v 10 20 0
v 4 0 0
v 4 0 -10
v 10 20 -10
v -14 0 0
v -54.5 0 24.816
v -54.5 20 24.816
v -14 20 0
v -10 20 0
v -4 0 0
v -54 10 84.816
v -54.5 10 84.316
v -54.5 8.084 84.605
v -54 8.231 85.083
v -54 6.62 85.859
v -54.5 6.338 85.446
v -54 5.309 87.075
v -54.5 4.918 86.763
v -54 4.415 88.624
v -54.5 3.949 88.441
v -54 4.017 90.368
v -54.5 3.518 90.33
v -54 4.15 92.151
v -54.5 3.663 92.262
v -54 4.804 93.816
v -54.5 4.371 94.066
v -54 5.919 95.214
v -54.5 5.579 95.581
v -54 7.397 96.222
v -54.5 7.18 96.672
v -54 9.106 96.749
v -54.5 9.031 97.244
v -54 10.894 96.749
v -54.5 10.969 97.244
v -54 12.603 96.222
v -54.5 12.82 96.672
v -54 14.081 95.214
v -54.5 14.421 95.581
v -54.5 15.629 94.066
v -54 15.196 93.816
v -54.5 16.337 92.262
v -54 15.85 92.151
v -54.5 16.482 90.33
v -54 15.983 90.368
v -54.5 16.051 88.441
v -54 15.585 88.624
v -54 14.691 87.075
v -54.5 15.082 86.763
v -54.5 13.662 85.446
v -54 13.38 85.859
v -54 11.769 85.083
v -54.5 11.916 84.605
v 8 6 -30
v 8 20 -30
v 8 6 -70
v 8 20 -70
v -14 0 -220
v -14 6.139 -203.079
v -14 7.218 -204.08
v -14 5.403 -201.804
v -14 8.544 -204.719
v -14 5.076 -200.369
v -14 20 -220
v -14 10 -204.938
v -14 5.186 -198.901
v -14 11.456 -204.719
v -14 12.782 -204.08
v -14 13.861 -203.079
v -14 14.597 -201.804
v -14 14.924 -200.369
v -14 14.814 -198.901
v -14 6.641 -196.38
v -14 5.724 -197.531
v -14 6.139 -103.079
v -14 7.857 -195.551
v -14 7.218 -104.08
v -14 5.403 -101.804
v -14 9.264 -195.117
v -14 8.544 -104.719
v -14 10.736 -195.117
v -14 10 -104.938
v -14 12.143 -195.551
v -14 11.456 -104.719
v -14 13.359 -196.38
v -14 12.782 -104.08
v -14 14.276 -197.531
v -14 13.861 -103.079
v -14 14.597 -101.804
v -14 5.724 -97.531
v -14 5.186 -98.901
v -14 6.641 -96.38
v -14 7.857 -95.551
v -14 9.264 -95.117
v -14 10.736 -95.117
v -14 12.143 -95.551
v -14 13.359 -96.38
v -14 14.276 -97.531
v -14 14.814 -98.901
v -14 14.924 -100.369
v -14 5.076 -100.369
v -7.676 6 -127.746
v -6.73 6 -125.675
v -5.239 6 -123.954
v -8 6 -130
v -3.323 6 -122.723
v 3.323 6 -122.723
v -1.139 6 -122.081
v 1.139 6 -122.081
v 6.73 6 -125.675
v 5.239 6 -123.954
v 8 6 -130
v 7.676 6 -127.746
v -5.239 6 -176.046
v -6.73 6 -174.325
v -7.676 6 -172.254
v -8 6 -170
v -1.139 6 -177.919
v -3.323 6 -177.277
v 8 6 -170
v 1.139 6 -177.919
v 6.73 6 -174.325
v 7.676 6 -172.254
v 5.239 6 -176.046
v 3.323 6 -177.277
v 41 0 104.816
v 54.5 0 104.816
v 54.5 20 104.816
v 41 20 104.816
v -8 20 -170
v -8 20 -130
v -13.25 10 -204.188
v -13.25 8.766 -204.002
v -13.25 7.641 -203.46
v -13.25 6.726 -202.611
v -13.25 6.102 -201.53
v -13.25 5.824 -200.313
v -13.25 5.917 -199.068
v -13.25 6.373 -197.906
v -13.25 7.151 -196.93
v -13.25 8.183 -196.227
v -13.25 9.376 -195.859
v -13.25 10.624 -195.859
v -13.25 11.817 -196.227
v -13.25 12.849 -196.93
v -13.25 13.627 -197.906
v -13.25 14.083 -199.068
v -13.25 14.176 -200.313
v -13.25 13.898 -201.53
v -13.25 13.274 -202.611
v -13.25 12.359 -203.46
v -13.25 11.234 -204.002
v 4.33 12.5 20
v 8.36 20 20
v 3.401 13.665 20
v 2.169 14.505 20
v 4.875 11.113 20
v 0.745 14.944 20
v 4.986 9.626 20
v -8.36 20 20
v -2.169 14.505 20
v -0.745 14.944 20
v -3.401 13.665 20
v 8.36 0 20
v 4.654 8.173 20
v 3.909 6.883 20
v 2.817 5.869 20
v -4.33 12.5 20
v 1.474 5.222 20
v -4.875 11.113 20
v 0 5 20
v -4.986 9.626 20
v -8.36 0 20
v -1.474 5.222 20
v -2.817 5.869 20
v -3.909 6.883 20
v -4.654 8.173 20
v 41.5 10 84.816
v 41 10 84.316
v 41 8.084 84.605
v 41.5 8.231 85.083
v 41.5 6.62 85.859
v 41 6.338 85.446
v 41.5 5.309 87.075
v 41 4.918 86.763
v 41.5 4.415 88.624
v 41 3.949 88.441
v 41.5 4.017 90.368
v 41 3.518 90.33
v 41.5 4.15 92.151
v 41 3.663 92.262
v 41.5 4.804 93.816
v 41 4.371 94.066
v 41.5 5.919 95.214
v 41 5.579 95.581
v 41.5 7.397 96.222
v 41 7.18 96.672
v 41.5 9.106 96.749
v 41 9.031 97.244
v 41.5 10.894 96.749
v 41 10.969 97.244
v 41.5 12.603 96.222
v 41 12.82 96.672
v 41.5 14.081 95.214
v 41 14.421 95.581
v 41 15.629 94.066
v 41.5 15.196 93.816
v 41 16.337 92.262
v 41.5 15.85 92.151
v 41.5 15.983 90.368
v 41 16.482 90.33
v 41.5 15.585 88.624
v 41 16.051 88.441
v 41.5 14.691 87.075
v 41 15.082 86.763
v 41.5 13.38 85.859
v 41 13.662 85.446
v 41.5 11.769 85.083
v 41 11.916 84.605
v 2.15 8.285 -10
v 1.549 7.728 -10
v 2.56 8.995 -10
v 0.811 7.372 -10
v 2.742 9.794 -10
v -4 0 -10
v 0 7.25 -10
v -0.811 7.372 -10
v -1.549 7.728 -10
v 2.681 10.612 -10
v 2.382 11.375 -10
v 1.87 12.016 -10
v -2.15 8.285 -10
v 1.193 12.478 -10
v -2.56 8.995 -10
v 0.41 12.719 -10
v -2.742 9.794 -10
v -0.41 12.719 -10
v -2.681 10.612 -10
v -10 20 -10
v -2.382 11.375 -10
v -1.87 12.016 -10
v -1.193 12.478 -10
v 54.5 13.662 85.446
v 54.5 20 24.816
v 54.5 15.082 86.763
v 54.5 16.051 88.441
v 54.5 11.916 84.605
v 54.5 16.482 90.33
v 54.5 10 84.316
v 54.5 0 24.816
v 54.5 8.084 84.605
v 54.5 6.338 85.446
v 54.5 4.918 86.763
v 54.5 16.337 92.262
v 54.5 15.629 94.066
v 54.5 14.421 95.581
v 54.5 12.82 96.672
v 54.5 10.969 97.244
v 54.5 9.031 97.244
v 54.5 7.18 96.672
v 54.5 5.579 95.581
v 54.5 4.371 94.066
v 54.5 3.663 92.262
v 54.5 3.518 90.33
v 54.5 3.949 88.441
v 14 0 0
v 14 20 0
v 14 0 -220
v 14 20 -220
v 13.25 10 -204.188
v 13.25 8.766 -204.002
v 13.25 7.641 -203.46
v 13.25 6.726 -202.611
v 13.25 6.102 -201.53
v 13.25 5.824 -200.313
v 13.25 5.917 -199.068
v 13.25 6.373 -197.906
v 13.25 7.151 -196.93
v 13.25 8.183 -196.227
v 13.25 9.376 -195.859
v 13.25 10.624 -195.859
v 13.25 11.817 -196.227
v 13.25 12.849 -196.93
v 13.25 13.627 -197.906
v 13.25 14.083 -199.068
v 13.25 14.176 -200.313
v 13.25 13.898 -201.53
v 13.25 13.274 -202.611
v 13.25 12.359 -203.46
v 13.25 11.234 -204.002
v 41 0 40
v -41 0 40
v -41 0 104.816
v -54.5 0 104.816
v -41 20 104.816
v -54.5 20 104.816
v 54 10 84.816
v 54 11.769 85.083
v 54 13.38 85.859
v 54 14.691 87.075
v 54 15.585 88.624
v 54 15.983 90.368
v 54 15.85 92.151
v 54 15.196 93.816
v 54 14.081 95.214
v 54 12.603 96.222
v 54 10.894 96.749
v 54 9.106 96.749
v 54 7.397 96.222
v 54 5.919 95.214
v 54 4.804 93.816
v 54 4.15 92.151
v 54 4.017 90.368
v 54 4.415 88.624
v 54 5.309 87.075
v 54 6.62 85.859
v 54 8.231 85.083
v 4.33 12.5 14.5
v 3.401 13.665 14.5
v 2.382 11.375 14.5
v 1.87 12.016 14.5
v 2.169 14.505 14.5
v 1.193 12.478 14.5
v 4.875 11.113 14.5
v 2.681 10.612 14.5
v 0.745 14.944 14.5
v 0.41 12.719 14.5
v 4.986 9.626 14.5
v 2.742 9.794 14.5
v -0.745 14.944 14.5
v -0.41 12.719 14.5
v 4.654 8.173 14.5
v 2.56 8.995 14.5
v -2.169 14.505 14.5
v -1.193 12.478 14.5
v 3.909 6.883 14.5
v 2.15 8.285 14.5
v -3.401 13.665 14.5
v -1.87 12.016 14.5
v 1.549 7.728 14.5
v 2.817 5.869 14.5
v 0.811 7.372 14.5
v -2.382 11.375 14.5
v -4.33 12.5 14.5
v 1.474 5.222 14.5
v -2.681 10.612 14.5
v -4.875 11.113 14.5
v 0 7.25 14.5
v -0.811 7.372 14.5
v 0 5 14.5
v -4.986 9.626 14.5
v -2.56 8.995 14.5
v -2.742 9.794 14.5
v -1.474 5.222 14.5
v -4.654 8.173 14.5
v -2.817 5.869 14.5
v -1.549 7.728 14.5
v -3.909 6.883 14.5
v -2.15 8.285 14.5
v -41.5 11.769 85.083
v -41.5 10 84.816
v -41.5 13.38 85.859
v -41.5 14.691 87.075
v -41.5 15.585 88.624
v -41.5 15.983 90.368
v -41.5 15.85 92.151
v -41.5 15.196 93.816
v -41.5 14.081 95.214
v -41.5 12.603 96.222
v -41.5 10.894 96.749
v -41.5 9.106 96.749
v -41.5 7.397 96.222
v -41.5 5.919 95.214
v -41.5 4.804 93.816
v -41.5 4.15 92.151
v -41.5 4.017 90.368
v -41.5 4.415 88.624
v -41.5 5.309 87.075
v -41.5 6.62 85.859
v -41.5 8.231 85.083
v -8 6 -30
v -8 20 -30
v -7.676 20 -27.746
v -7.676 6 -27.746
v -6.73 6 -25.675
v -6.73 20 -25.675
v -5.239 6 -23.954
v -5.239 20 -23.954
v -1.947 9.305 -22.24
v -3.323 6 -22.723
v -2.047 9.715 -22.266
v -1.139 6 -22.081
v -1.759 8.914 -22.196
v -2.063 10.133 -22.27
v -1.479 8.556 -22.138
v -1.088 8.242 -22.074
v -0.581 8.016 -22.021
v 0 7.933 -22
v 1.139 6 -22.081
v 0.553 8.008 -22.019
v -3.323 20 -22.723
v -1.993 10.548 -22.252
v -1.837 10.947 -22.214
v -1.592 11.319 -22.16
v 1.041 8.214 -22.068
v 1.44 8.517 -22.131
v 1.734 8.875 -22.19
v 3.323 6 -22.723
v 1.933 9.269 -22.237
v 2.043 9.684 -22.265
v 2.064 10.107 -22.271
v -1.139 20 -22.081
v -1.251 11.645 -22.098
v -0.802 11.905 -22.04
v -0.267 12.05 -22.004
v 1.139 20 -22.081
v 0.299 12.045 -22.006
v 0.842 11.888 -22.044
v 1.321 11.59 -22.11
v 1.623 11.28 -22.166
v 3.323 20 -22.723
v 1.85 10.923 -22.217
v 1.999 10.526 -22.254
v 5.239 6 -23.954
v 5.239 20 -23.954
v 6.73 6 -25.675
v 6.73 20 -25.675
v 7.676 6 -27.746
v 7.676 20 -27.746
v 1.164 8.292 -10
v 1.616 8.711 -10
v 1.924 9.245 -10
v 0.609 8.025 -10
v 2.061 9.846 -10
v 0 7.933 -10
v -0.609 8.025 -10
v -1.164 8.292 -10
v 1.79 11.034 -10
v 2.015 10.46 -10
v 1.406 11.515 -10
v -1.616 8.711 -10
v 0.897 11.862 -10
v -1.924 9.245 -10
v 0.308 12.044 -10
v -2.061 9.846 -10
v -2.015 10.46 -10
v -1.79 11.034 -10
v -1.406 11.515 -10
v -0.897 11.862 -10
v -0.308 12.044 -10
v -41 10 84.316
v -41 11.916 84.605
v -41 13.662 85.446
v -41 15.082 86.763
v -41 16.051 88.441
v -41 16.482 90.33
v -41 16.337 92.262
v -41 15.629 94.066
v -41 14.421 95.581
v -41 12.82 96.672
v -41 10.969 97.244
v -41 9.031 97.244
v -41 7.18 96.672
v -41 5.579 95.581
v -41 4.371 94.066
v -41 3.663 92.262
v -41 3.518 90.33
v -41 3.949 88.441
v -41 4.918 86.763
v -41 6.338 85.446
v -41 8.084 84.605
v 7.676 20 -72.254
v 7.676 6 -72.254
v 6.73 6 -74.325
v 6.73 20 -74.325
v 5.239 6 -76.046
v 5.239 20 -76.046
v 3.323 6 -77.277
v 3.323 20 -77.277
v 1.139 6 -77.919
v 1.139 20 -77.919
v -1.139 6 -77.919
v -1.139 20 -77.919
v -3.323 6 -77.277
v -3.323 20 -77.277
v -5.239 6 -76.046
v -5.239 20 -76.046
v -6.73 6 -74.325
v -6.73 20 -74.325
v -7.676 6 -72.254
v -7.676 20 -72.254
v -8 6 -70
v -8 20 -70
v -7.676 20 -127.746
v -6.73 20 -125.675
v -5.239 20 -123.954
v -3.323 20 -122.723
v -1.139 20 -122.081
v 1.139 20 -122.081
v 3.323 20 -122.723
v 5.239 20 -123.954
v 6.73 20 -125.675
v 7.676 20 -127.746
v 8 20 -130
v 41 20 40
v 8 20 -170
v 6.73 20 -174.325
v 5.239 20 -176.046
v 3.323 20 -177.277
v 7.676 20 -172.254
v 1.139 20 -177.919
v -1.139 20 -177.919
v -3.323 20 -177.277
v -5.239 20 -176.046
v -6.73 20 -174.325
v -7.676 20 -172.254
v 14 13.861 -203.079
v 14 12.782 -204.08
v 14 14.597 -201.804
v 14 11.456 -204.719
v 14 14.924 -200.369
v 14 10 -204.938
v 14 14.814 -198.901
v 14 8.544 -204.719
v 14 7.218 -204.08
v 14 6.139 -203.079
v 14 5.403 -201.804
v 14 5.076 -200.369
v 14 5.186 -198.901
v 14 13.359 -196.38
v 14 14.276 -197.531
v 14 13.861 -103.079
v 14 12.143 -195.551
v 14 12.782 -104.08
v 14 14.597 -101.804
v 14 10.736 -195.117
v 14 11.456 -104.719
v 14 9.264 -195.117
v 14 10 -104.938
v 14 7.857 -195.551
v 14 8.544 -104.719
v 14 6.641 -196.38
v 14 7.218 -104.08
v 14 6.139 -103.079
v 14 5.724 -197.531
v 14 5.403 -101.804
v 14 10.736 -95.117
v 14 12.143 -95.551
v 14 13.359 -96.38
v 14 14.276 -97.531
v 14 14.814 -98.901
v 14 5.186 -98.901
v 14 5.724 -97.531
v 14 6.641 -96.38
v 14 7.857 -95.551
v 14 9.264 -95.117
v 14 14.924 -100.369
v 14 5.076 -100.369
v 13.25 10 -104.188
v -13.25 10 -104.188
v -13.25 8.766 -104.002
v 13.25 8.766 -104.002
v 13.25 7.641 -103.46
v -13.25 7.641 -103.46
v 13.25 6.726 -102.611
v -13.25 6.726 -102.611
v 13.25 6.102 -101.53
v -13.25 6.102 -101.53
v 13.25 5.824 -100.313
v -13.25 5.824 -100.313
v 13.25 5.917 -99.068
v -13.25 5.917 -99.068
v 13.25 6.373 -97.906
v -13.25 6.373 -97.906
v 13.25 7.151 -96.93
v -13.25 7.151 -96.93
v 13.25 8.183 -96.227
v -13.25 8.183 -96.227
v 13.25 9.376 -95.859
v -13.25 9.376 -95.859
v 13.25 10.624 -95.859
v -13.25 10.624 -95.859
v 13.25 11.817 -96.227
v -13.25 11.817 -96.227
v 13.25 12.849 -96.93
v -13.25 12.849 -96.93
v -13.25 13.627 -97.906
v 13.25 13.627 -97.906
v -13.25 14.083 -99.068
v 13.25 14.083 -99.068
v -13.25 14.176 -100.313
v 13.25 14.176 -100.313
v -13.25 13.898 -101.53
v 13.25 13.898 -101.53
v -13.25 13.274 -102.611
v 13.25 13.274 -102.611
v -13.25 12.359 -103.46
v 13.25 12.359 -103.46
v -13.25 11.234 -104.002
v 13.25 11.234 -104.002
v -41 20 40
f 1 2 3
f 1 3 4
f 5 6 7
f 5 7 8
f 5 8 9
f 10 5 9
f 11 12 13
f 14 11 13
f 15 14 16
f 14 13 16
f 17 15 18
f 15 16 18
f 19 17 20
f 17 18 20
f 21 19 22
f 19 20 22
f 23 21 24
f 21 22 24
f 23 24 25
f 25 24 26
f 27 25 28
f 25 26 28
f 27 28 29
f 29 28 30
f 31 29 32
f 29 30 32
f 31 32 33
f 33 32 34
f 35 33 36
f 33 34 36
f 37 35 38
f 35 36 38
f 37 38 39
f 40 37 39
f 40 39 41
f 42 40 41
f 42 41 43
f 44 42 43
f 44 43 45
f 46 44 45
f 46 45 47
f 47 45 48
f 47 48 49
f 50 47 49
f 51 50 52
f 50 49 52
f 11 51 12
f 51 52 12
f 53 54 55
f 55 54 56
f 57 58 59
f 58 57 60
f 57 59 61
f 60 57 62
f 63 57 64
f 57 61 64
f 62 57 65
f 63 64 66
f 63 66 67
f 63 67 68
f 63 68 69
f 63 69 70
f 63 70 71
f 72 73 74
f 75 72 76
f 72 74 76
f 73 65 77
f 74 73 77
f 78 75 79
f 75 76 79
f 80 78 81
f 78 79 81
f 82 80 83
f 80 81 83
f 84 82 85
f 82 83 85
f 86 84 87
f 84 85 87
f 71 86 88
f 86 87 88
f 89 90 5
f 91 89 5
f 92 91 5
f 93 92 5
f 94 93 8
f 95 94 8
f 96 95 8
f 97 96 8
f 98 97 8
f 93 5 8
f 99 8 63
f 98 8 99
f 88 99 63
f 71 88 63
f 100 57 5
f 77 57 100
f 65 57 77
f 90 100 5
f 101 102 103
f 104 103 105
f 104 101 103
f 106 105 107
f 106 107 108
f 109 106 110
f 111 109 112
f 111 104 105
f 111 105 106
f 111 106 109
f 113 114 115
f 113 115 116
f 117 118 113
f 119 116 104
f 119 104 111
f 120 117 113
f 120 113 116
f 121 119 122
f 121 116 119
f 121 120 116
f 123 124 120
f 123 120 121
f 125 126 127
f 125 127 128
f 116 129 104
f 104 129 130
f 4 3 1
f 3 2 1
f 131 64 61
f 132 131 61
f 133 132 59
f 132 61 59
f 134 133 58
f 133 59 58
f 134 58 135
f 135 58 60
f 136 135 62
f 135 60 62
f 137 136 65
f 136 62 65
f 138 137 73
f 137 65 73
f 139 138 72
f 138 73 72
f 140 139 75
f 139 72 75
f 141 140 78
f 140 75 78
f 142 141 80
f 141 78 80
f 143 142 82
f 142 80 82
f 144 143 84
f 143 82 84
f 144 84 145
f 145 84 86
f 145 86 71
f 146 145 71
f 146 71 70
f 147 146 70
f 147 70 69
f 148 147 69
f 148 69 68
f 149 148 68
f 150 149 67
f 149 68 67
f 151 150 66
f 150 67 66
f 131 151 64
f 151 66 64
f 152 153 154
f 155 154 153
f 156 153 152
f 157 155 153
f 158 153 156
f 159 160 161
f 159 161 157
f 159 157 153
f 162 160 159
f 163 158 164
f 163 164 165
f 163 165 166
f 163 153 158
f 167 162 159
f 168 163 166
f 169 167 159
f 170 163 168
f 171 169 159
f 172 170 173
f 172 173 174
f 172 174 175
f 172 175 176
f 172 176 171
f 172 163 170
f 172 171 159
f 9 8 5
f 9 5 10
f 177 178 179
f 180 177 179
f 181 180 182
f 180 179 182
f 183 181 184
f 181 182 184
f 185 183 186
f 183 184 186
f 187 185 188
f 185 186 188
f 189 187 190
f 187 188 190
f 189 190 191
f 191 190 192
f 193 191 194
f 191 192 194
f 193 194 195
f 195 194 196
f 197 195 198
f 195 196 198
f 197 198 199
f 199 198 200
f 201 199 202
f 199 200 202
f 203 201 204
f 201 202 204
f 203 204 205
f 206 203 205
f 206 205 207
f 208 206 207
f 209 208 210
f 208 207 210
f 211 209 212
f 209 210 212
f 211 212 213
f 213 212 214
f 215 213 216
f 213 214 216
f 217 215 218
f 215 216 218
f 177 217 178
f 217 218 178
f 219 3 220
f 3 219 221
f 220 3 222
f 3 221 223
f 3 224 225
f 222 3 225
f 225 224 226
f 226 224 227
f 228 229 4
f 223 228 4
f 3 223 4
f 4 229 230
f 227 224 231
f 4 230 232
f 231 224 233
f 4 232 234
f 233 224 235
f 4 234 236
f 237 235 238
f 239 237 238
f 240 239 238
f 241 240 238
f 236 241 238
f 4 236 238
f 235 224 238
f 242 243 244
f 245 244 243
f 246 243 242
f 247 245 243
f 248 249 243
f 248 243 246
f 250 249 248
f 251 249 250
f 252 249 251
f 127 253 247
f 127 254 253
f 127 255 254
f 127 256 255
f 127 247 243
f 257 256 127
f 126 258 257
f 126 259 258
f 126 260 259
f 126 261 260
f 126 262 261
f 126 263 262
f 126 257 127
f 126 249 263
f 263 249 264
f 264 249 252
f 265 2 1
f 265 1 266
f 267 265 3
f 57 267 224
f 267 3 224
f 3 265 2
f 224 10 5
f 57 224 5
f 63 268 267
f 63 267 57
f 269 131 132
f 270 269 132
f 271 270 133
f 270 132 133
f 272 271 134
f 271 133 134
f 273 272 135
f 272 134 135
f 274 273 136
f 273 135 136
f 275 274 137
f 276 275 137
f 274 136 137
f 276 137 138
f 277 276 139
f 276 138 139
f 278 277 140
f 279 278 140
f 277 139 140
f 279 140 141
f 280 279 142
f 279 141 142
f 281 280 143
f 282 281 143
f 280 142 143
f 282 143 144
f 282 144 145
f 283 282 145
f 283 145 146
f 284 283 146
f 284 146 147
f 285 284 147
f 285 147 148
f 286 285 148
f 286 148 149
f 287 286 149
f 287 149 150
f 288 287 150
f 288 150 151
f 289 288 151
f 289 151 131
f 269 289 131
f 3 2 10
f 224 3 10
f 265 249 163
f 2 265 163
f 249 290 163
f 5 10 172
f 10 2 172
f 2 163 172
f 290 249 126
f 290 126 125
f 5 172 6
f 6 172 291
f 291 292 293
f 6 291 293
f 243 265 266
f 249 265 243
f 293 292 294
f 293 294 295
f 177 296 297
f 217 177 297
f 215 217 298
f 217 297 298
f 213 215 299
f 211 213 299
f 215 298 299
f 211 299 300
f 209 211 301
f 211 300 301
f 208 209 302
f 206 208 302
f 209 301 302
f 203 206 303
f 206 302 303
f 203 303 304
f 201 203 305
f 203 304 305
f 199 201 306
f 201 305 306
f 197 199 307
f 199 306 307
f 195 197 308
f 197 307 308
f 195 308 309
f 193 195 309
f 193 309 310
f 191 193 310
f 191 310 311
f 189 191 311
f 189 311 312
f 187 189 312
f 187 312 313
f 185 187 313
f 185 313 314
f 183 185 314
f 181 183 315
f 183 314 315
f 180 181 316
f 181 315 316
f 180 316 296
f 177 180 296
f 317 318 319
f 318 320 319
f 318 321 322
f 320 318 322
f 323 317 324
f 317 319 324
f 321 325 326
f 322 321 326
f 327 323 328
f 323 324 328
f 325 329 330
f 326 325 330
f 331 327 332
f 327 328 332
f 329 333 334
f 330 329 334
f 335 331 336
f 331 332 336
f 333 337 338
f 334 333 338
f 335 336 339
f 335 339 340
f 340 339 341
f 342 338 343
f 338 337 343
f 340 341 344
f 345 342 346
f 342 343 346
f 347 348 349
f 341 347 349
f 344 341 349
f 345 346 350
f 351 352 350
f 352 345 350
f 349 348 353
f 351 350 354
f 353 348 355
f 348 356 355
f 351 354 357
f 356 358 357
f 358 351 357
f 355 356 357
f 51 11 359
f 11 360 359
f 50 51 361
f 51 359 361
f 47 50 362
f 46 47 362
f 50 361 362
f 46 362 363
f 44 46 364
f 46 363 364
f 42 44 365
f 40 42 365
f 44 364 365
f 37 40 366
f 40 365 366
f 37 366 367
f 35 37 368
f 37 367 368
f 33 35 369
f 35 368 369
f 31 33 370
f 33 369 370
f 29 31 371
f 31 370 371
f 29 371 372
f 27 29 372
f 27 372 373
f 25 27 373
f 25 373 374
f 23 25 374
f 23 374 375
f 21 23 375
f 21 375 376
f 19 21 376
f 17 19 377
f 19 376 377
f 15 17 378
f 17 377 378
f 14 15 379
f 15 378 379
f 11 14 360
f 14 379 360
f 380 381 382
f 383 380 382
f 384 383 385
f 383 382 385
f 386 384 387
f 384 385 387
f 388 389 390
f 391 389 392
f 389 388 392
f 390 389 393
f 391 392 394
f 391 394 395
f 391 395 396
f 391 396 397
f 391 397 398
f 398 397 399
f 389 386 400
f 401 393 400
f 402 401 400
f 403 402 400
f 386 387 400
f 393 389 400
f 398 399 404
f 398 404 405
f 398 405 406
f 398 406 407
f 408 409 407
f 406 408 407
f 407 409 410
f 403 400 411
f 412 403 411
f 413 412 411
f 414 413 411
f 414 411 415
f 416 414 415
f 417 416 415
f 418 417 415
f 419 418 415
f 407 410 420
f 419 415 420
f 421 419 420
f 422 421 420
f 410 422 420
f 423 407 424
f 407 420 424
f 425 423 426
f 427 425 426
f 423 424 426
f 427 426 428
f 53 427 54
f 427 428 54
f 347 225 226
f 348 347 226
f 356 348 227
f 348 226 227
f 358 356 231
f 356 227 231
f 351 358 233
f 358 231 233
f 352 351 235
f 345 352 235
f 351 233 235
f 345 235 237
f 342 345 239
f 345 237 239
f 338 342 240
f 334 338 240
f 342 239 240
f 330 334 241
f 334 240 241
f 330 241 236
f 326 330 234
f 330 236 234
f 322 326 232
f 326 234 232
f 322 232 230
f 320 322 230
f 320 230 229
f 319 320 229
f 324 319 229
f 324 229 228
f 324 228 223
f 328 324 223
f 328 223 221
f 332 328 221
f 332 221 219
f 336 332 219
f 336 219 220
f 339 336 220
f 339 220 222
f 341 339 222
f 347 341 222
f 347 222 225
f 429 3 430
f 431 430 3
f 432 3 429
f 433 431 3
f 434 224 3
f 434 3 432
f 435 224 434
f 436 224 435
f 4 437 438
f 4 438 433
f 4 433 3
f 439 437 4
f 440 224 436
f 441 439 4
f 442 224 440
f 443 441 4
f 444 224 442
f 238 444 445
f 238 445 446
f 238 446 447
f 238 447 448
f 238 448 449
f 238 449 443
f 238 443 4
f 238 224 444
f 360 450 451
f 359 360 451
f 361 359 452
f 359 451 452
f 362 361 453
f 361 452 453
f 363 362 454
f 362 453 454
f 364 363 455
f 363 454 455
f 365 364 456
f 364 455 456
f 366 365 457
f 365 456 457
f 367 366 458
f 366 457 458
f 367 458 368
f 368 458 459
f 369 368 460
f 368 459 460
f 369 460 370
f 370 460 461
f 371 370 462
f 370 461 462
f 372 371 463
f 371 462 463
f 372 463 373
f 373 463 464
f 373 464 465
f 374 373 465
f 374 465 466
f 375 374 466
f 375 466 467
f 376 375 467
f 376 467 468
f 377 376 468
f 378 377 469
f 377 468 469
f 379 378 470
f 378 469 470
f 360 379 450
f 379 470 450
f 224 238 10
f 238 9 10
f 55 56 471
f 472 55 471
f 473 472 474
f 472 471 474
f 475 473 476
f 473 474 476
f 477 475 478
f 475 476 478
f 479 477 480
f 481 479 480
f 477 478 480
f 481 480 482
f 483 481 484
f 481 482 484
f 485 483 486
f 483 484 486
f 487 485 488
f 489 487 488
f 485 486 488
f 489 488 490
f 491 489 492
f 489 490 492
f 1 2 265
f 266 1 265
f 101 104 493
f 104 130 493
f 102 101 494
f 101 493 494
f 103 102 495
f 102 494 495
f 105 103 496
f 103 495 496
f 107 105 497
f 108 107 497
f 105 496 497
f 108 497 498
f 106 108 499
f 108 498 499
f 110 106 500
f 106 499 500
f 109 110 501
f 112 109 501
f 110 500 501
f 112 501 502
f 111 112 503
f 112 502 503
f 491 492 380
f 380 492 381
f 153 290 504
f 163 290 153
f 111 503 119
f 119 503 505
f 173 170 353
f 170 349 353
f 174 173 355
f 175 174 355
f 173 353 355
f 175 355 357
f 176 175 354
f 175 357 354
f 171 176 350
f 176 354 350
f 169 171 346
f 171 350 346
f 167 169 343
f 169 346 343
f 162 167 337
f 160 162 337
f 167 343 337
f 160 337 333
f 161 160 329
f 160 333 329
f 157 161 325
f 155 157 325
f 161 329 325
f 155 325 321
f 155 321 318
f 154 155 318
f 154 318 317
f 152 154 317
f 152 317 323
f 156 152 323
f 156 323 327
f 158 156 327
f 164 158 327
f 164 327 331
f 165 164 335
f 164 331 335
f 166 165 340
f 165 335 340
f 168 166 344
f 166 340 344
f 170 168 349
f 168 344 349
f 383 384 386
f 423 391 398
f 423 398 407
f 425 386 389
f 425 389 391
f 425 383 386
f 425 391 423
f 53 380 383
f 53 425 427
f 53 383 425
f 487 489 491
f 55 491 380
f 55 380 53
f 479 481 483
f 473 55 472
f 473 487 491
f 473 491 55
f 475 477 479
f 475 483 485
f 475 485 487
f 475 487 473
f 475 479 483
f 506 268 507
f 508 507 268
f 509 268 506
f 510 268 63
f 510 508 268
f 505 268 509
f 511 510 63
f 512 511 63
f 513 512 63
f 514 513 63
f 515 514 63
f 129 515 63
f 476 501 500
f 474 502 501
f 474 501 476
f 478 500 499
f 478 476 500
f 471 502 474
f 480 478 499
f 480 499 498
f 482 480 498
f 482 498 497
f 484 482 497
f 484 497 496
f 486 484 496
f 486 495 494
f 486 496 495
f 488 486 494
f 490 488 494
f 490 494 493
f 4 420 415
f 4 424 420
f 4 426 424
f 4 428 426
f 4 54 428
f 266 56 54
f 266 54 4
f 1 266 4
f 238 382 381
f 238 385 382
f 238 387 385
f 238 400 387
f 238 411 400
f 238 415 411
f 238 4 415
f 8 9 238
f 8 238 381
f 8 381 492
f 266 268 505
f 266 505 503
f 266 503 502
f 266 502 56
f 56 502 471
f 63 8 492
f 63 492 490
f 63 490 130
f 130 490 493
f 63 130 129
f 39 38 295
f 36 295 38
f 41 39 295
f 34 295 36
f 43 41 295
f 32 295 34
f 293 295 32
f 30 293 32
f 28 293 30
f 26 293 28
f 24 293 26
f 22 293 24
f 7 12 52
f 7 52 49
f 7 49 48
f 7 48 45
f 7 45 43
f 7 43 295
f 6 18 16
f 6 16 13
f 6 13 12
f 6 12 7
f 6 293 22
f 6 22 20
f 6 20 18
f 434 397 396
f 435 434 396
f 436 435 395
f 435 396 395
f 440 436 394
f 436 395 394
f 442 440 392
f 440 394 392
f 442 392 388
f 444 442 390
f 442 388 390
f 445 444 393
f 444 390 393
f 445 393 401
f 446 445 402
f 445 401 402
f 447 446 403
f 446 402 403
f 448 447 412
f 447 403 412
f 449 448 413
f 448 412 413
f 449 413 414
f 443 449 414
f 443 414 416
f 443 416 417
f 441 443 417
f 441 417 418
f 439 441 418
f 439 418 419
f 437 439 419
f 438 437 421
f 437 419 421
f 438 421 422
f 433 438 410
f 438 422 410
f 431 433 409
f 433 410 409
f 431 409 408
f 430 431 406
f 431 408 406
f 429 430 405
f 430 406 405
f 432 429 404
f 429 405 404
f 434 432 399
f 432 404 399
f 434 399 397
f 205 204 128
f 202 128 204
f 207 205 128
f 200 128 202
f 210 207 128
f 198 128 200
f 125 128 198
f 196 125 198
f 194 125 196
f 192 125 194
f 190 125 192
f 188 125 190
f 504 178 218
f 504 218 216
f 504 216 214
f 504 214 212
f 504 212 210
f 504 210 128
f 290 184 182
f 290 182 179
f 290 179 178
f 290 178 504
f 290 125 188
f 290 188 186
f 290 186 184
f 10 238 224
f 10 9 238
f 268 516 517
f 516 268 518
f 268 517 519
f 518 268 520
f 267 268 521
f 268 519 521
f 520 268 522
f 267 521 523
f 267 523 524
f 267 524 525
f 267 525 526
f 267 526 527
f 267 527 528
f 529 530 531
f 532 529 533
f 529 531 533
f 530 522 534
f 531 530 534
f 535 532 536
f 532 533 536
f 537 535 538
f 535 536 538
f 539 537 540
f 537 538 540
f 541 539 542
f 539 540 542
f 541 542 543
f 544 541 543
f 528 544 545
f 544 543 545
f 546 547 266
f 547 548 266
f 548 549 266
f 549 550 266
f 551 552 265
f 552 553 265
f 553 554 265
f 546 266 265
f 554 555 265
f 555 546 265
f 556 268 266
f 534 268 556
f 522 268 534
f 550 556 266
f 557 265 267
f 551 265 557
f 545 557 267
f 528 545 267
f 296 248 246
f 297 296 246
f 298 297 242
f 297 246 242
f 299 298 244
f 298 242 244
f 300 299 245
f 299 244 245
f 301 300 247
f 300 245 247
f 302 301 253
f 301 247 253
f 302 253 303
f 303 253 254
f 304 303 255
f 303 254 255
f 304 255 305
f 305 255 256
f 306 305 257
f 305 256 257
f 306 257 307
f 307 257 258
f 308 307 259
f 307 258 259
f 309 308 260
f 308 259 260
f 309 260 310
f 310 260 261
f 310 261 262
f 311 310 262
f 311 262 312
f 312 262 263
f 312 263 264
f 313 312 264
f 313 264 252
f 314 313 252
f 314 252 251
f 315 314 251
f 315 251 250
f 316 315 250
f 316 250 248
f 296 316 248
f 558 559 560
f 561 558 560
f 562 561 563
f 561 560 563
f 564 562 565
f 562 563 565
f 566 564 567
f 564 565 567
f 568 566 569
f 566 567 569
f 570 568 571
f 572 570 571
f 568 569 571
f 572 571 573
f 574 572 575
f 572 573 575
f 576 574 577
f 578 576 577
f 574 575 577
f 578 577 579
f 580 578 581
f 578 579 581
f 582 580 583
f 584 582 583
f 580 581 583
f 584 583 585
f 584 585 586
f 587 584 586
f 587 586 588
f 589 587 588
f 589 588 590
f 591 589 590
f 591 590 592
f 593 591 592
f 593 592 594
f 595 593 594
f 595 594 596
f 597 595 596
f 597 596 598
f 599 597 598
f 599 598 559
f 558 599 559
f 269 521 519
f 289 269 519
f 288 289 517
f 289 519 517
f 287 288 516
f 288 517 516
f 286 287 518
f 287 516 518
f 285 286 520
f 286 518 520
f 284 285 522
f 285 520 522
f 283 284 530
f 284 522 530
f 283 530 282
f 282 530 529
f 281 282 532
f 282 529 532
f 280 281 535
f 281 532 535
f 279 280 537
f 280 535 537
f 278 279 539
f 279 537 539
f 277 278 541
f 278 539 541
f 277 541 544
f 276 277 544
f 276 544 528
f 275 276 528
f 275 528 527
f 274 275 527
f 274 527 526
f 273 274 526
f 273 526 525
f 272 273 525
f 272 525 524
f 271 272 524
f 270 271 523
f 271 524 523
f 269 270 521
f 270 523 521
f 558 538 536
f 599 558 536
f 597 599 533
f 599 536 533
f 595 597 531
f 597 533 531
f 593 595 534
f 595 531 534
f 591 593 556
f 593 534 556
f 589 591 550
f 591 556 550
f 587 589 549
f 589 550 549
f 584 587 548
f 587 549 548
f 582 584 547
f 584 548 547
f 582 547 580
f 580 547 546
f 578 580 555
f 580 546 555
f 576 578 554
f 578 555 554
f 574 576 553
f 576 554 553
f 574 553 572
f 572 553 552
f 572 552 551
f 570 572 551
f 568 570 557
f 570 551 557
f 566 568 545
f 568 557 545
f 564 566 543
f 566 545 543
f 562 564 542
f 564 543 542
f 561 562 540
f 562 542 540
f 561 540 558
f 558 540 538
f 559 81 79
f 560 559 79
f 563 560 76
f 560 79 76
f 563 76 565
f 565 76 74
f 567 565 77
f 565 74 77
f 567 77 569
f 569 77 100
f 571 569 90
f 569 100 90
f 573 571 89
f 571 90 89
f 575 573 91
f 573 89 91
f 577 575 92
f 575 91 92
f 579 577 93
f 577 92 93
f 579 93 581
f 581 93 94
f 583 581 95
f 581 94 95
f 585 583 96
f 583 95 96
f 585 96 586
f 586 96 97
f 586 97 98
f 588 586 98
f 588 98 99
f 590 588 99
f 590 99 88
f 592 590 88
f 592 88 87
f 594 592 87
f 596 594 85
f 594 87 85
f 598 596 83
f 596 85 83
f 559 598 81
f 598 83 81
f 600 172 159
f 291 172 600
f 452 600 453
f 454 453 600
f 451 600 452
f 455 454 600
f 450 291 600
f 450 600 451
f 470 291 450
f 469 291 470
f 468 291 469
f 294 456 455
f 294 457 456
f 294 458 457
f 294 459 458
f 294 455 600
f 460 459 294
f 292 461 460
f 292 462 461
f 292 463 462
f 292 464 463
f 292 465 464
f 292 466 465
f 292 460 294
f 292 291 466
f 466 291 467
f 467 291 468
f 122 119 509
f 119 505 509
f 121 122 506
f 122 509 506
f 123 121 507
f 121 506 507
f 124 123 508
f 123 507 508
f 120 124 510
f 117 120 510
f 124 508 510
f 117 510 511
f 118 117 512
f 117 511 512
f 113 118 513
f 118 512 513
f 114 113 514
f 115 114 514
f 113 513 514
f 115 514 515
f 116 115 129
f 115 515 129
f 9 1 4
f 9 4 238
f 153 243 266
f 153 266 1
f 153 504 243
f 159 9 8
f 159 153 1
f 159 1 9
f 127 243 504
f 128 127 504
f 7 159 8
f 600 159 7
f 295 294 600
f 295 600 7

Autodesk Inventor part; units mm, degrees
sketch "Skizze1" plane through (0, 0, 0) normal (0, 1, 0) x (-1, 0, 0)
  line L0 (54.5, 104.8161) -> (54.5, 24.8161)
  line L1 (54.5, 24.8161) -> (14, 0)
  line L2 (14, 0) -> (-14, 0)
  line L3 (-14, 0) -> (-54.5, 24.8161)
  line L4 (-54.5, 24.8161) -> (-54.5, 104.8161)
  line L5 (-54.5, 104.8161) -> (-41, 104.8161)
  line L6 (-41, 104.8161) -> (-41, 40)
  line L7 (-41, 40) -> (-8.3599, 20)
  line L8 (-8.3599, 20) -> (8.3599, 20)
  line L9 (8.3599, 20) -> (41, 40)
  line L10 (41, 40) -> (41, 104.8161)
  line L11 (41, 104.8161) -> (54.5, 104.8161)
  line L12 (0, -284.9632) -> (0, 169.7793) construction
  line L13 (41, 40) -> (54.5, 40) construction
  point P0 (0, 0)
  point P1 (0, 20)
  dimension "d0" = 82
  dimension "d1" = 13.5
  dimension "d2" = 13.5
  dimension "d113" = 28
  dimension "d114" = 20
  dimension "d115" = 80
  dimension "d117" = 20
  dimension "d118" = 20
extrude "Extrusion1" add sketch "Skizze1" along normal blind 20
sketch "Skizze2" plane through (14, 0, 0) normal (0, 0, -1) x (-1, 0, 0)
  line L0 (55, 20) -> (22.3599, 20) construction
  line L1 (0, 0) -> (28, 0)
  line L2 (28, 0) -> (28, 20)
  line L3 (28, 20) -> (0, 20)
  line L4 (0, 20) -> (0, 0)
  line L5 (14, -4) -> (14, 24) construction
  line L6 (0, 0) -> (28, 0) construction
  point P0 (14, 0)
  point P1 (14, 0)
  point P2 (14, 20)
  dimension "d75" = 28
extrude "Extrusion2" add sketch "Skizze2" along normal blind 220
ref_plane "Arbeitsebene1" through (53.5, 2, 88) normal (1, 0, 0) x (0, 0, -1)
sketch "Skizze3" plane through (54.5, 0, 104.8161) normal (1, 0, 0) x (0, 0, -1)
  line L0 (0, 10) -> (14, 10) construction
  line L1 (0, 0) -> (0, 20) construction
  circle A0 centre (14, 10) radius 6
  dimension "d44" = 14
  dimension "d87" = 12
extrude "Extrusion3" cut sketch "Skizze3" against normal through all
ref_plane "Arbeitsebene5" through (14, 0, -200) normal (0, 0, -1) x (-1, 0, 0)
ref_plane "Arbeitsebene6" through (14, 0, -100) normal (0, 0, -1) x (-1, 0, 0)
ref_plane "Arbeitsebene7" through (14, 0, -150) normal (0, 0, -1) x (-1, 0, 0)
sketch "Skizze13" plane through (14, 0, 104.8161) normal (1, 0, 0) x (0, 0, -1)
  line L0 (304.8161, 24) -> (304.8161, -4) construction
  line L1 (204.8161, 24) -> (204.8161, -4) construction
  line L2 (324.8161, 0) -> (324.8161, 20) construction
  line L3 (324.8161, 10) -> (204.8161, 10) construction
  point P0 (104.8161, 0)
  point P1 (304.8161, 10)
hole "Bohrung2" at (14, 10, -100) at (14, 10, -200) direction (-1, 0, 0) diameter 8.376 end through all thread size "M10x1.5" class "6H" standard "ISO Metric profile"
sketch "Skizze12" plane through (14, 0, -220) normal (0, 0, -1) x (-1, 0, 0)
  line L0 (28, 20) -> (0, 20) construction
  point P0 (14, 0)
  dimension "Gabel_FixierungPart_Width" = 28
chamfer "Fase1" distance 0.75 angle 45 4 edges at (14, 10, -95.812) (14, 10, -195.812) (-14, 10, -195.812) (-14, 10, -95.812)
chamfer "Fase2" distance 0.5 angle 45 4 edges at (54.5, 10, 96.8161) (41, 10, 96.8161) (-54.5, 10, 96.8161) (-41, 10, 96.8161)
sketch "Skizze15" plane through (0, 20, 0) normal (0, 1, 0) x (1, 0, 0)
  line L0 (-76.3, 100) -> (76.3, 100) construction
  line L1 (0, 30) -> (0, 70) construction
  line L2 (8, 30) -> (8, 70)
  line L3 (-8, 70) -> (-8, 30)
  arc A0 (-8, 30) -> (8, 30) centre (0, 30) ccw
  arc A1 (8, 70) -> (-8, 70) centre (0, 70) ccw
  line L4 (-14, 0) -> (-14, 220) construction
  line L5 (14, 0) -> (14, 220) construction
  line L6 (-14, 100) -> (14, 100) construction
  line L7 (-14, 100) -> (14, 100) construction
  line L8 (-76.3, 200) -> (76.3, 200) construction
  line L9 (-14, 200) -> (14, 200) construction
  line L10 (0, 130) -> (0, 170) construction
  line L11 (8, 130) -> (8, 170)
  line L12 (-8, 170) -> (-8, 130)
  arc A2 (-8, 130) -> (8, 130) centre (0, 130) ccw
  arc A3 (8, 170) -> (-8, 170) centre (0, 170) ccw
  line L13 (0, 264) -> (0, -44) construction
  point P0 (0, 0)
  point P1 (0, 50)
  point P2 (0, 100)
  point P3 (0, 100)
  point P4 (0, 150)
  point P5 (0, 200)
  dimension "d124" = 0
  dimension "d125" = 100
  dimension "d126" = 50
  dimension "d127" = 40
  dimension "d130" = 0
  dimension "d131" = 0
  dimension "d133" = 40
  dimension "d134" = 100
  dimension "d135" = 50
  dimension "d156" = 16
  dimension "d157" = 16
extrude "Extrusion13" cut sketch "Skizze15" against normal blind 14
ref_plane "Arbeitsebene8" through (0, 0, 0) normal (1, 0, 0) x (0, 0, -1)
ref_plane "Arbeitsebene9" through (14, 0, 0) normal (0, 0, 1) x (0, 1, 0)
split body "Trennen1" result two bodies by plane through (14, 0, 0) normal (0, 0, 1) first body at (-50, 0.5, 56.5441)
sketch "Skizze16" plane through (14, 0, 0) normal (0, 0, 1) x (0, 1, 0)
  line L0 (0, 0) -> (20, 0) construction
  line L1 (0, 0) -> (0, 28) construction
  line L2 (0, 28) -> (20, 28) construction
  line L3 (20, 28) -> (20, 0) construction
  line L4 (20, 4) -> (20, 24)
  line L5 (20, 24) -> (0, 18)
  line L6 (0, 18) -> (0, 10)
  line L7 (0, 10) -> (20, 4)
  line L8 (0, 14) -> (20, 14) construction
  point P0 (0, 14)
  point P1 (10, 14)
  dimension "d136" = 20
  dimension "d137" = 8
extrude "Extrusion14" add sketch "Skizze16" against normal blind 10 bodies 2
extrude "Extrusion15" cut sketch "Skizze16" against normal blind 10 bodies 3
sketch "Skizze17" plane through (-8.3599, 0, 20) normal (0, 0, 1) x (1, 0, 0)
  point P0 (8.3599, 0)
  point P1 (8.3599, 10)
hole "Bohrung3" at (0, 10, 20) direction (0, 0, -1) diameter 5.5 depth 30 counterbore diameter 10 counterbore depth 5.5 bodies 2 clearance for "Inbusschraube DIN EN ISO 4762" size "M5" standard "DIN"
sketch "Skizze18" plane through (14, 0, -10) normal (0, 0, 1) x (1, 0, 0)
  point P0 (-14, 0)
  point P1 (-14, 10)
hole "Bohrung4" at (0, 10, 0) direction (0, 0, -1) diameter 4.134 end up to surface bodies 3 thread size "M5x0.8" class "6H" standard "ISO Metric profile"
equation "\"d1\" = d2"
equation "\"d113\" = -2 * Gabel_FixationShaft_Contact_Thickness + MainAxis_Schluesselweite + 2 * ParallelMecha_Bearing_Step_Thickness - 2 * Anlaufscheibe_Ueberstand"
equation "\"d75\" = -2 * Gabel_FixationShaft_Contact_Thickness + MainAxis_Schluesselweite + 2 * ParallelMecha_Bearing_Step_Thickness - 2 * Anlaufscheibe_Ueberstand"
equation "\"ParallelMecha_Bearing_Step_Thickness\" = 6"
equation "\"Anlaufscheibe_Ueberstand\" = 0.5"
equation "\"Gabel_FixationShaft_Contact_Thickness\" = 3.5"
equation "\"MainAxis_Schluesselweite\" = 24"
properties part number "Adaptationhorizontalachse_Rillenkugellager" material "PBT-Kunststoff"
